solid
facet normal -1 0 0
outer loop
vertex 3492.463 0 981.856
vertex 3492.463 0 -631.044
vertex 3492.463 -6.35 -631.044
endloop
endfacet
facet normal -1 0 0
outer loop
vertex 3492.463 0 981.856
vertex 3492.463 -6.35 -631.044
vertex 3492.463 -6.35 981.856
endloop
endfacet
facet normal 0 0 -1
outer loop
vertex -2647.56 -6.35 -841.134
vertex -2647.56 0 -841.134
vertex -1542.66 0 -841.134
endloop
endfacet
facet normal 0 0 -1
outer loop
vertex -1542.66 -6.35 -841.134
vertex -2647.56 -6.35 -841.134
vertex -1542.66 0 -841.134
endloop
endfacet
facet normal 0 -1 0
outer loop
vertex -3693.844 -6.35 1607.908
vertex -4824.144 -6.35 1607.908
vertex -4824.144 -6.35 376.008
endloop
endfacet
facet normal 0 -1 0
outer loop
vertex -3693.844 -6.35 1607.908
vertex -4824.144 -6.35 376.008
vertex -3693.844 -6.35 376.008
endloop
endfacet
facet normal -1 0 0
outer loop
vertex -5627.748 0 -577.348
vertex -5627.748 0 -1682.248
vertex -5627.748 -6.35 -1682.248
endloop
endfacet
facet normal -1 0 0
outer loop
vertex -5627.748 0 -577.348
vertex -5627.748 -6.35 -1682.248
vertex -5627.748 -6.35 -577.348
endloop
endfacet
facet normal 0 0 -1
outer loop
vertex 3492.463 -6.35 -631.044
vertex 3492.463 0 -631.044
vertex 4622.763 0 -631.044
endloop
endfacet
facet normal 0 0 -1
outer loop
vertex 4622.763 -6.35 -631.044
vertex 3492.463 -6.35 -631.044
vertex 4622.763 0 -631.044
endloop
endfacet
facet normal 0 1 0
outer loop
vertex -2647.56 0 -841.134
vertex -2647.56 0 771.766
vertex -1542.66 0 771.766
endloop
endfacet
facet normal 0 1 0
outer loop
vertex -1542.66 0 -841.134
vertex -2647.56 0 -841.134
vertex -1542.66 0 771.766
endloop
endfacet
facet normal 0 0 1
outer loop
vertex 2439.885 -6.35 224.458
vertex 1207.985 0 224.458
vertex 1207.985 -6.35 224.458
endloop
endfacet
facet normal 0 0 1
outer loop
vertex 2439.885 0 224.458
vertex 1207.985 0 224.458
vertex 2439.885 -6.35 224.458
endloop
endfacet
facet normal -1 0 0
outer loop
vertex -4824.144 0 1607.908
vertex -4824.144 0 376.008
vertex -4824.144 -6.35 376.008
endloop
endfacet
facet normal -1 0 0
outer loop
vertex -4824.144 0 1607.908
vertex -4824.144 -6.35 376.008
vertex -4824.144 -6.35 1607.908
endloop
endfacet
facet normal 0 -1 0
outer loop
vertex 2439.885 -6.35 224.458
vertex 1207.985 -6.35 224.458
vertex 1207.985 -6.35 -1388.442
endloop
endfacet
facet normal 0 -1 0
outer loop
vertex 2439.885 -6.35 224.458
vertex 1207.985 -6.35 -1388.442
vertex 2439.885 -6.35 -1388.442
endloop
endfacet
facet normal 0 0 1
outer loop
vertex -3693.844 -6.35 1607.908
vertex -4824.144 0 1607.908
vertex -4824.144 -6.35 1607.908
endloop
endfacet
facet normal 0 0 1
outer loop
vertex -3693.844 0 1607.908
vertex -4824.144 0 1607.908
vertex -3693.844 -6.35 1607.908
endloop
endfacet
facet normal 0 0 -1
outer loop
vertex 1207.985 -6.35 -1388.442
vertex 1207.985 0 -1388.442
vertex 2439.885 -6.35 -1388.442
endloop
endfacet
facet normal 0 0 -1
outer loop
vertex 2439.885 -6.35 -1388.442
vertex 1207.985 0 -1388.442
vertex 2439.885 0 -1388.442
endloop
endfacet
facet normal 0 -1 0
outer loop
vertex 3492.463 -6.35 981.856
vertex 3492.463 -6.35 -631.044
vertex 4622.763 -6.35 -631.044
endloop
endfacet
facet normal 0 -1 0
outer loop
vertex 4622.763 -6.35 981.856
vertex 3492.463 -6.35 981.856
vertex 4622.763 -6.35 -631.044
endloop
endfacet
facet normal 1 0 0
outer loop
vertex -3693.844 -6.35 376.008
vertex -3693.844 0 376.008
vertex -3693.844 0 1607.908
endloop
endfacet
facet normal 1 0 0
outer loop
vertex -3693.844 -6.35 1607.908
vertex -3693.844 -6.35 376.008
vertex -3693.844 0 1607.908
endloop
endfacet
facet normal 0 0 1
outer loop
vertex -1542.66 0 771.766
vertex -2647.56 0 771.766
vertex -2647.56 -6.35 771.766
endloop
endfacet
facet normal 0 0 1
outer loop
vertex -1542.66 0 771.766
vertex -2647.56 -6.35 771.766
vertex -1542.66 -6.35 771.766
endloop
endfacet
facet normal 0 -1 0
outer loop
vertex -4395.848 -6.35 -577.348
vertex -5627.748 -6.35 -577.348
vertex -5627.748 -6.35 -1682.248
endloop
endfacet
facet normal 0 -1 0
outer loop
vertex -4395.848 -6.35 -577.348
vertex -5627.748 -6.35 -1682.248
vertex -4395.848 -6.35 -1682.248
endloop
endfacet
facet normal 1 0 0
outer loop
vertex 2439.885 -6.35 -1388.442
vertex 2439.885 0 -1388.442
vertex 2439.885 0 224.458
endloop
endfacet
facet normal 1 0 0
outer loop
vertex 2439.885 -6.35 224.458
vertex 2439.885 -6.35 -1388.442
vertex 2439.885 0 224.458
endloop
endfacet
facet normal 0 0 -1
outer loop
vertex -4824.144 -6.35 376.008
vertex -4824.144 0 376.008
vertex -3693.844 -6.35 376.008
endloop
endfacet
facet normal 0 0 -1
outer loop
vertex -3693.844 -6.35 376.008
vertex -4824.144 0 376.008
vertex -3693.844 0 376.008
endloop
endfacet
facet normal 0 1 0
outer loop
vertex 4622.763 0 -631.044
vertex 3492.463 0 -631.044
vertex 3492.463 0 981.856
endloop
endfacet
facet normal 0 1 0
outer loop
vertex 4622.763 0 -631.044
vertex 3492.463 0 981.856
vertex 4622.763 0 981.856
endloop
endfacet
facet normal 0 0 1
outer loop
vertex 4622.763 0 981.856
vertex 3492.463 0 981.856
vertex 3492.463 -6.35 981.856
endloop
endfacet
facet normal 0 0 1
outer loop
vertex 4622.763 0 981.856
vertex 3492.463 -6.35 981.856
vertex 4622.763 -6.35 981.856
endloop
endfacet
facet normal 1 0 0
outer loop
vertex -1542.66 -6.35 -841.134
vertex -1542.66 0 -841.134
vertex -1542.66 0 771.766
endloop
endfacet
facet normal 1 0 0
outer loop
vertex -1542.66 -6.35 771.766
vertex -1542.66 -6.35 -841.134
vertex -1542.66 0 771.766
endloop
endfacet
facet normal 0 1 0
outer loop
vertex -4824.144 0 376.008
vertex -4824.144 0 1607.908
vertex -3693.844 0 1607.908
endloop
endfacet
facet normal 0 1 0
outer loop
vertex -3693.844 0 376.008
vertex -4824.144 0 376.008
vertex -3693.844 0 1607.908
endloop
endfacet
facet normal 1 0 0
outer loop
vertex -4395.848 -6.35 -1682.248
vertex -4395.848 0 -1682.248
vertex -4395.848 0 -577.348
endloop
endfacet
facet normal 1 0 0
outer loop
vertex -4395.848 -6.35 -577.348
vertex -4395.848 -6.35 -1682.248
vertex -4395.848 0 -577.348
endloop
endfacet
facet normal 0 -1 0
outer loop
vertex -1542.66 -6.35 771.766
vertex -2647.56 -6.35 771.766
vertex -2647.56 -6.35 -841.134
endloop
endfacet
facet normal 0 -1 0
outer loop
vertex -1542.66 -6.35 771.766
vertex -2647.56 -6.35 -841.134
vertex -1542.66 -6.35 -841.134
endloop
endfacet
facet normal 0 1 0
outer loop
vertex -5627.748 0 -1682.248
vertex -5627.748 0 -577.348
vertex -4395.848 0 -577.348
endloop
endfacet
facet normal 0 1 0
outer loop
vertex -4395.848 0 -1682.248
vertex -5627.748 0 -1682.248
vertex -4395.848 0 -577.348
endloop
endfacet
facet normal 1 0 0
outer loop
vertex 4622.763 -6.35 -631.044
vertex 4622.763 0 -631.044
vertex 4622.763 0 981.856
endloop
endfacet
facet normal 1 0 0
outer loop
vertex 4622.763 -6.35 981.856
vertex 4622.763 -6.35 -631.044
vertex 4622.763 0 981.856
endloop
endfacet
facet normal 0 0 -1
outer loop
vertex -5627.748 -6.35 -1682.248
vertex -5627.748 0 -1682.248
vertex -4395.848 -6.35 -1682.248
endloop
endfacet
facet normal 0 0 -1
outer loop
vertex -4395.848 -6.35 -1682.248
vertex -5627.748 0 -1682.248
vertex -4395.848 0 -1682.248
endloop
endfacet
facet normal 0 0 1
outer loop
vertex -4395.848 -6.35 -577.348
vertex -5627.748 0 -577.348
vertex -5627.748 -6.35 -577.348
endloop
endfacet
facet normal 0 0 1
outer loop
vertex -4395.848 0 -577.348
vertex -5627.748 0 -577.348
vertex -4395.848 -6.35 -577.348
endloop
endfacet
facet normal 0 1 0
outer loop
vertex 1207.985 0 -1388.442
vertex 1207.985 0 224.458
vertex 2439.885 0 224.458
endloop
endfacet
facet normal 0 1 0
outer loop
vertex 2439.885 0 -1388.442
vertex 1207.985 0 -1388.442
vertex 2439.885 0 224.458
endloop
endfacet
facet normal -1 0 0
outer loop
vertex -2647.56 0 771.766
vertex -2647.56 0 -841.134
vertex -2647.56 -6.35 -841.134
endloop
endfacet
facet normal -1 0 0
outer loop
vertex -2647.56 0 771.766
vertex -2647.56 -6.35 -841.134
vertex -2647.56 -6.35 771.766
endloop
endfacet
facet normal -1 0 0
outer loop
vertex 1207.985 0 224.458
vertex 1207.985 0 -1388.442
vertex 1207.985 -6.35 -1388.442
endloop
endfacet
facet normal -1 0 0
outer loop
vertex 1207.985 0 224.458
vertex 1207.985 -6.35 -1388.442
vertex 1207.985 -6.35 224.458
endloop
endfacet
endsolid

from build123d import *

# Parameters (mm, degrees)
F0_W      = 1219.2
F0_H      = 2438.4
F1_DEPTH  = 6.35
F2_W      = 1104.9
F2_H      = 1612.9
F3_DEPTH  = 6.35
F4_W      = 1231.9
F4_H      = 1612.9
F5_DEPTH  = 6.35
F6_W      = 1231.9
F6_H      = 1104.9
F7_DEPTH  = 6.35
F8_W      = 1130.3
F8_H      = 1231.9
F9_DEPTH  = 6.35
F10_W     = 1130.3
F10_H     = 1612.9
F11_DEPTH = 6.35


with BuildPart() as f1:
    # F0 (on Front) → F1 (new body)
    with BuildSketch(Plane.XZ):
        with Locations((9.893047, 686.749916)):
            Rectangle(F0_W, F0_H)
    extrude(amount=F1_DEPTH)


with BuildPart() as f3:
    # F2 (on Front) → F3 (new body)
    with BuildSketch(Plane.XZ):
        with Locations((-2095.109601, -34.684066)):
            Rectangle(F2_W, F2_H)
    extrude(amount=F3_DEPTH)


with BuildPart() as f5:
    # F4 (on Front) → F5 (new body)
    with BuildSketch(Plane.XZ):
        with Locations((1823.935289, -581.991924)):
            Rectangle(F4_W, F4_H)
    extrude(amount=F5_DEPTH)


with BuildPart() as f7:
    # F6 (on Front) → F7 (new body)
    with BuildSketch(Plane.XZ):
        with Locations((-5011.798177, -1129.798278)):
            Rectangle(F6_W, F6_H)
    extrude(amount=F7_DEPTH)


with BuildPart() as f9:
    # F8 (on Front) → F9 (new body)
    with BuildSketch(Plane.XZ):
        with Locations((-4258.993506, 991.957669)):
            Rectangle(F8_W, F8_H)
    extrude(amount=F9_DEPTH)


with BuildPart() as f11:
    # F10 (on Front) → F11 (new body)
    with BuildSketch(Plane.XZ):
        with Locations((4057.612896, 175.406297)):
            Rectangle(F10_W, F10_H)
    extrude(amount=F11_DEPTH)


solid = Compound([f3.part, f5.part, f7.part, f9.part, f11.part])
